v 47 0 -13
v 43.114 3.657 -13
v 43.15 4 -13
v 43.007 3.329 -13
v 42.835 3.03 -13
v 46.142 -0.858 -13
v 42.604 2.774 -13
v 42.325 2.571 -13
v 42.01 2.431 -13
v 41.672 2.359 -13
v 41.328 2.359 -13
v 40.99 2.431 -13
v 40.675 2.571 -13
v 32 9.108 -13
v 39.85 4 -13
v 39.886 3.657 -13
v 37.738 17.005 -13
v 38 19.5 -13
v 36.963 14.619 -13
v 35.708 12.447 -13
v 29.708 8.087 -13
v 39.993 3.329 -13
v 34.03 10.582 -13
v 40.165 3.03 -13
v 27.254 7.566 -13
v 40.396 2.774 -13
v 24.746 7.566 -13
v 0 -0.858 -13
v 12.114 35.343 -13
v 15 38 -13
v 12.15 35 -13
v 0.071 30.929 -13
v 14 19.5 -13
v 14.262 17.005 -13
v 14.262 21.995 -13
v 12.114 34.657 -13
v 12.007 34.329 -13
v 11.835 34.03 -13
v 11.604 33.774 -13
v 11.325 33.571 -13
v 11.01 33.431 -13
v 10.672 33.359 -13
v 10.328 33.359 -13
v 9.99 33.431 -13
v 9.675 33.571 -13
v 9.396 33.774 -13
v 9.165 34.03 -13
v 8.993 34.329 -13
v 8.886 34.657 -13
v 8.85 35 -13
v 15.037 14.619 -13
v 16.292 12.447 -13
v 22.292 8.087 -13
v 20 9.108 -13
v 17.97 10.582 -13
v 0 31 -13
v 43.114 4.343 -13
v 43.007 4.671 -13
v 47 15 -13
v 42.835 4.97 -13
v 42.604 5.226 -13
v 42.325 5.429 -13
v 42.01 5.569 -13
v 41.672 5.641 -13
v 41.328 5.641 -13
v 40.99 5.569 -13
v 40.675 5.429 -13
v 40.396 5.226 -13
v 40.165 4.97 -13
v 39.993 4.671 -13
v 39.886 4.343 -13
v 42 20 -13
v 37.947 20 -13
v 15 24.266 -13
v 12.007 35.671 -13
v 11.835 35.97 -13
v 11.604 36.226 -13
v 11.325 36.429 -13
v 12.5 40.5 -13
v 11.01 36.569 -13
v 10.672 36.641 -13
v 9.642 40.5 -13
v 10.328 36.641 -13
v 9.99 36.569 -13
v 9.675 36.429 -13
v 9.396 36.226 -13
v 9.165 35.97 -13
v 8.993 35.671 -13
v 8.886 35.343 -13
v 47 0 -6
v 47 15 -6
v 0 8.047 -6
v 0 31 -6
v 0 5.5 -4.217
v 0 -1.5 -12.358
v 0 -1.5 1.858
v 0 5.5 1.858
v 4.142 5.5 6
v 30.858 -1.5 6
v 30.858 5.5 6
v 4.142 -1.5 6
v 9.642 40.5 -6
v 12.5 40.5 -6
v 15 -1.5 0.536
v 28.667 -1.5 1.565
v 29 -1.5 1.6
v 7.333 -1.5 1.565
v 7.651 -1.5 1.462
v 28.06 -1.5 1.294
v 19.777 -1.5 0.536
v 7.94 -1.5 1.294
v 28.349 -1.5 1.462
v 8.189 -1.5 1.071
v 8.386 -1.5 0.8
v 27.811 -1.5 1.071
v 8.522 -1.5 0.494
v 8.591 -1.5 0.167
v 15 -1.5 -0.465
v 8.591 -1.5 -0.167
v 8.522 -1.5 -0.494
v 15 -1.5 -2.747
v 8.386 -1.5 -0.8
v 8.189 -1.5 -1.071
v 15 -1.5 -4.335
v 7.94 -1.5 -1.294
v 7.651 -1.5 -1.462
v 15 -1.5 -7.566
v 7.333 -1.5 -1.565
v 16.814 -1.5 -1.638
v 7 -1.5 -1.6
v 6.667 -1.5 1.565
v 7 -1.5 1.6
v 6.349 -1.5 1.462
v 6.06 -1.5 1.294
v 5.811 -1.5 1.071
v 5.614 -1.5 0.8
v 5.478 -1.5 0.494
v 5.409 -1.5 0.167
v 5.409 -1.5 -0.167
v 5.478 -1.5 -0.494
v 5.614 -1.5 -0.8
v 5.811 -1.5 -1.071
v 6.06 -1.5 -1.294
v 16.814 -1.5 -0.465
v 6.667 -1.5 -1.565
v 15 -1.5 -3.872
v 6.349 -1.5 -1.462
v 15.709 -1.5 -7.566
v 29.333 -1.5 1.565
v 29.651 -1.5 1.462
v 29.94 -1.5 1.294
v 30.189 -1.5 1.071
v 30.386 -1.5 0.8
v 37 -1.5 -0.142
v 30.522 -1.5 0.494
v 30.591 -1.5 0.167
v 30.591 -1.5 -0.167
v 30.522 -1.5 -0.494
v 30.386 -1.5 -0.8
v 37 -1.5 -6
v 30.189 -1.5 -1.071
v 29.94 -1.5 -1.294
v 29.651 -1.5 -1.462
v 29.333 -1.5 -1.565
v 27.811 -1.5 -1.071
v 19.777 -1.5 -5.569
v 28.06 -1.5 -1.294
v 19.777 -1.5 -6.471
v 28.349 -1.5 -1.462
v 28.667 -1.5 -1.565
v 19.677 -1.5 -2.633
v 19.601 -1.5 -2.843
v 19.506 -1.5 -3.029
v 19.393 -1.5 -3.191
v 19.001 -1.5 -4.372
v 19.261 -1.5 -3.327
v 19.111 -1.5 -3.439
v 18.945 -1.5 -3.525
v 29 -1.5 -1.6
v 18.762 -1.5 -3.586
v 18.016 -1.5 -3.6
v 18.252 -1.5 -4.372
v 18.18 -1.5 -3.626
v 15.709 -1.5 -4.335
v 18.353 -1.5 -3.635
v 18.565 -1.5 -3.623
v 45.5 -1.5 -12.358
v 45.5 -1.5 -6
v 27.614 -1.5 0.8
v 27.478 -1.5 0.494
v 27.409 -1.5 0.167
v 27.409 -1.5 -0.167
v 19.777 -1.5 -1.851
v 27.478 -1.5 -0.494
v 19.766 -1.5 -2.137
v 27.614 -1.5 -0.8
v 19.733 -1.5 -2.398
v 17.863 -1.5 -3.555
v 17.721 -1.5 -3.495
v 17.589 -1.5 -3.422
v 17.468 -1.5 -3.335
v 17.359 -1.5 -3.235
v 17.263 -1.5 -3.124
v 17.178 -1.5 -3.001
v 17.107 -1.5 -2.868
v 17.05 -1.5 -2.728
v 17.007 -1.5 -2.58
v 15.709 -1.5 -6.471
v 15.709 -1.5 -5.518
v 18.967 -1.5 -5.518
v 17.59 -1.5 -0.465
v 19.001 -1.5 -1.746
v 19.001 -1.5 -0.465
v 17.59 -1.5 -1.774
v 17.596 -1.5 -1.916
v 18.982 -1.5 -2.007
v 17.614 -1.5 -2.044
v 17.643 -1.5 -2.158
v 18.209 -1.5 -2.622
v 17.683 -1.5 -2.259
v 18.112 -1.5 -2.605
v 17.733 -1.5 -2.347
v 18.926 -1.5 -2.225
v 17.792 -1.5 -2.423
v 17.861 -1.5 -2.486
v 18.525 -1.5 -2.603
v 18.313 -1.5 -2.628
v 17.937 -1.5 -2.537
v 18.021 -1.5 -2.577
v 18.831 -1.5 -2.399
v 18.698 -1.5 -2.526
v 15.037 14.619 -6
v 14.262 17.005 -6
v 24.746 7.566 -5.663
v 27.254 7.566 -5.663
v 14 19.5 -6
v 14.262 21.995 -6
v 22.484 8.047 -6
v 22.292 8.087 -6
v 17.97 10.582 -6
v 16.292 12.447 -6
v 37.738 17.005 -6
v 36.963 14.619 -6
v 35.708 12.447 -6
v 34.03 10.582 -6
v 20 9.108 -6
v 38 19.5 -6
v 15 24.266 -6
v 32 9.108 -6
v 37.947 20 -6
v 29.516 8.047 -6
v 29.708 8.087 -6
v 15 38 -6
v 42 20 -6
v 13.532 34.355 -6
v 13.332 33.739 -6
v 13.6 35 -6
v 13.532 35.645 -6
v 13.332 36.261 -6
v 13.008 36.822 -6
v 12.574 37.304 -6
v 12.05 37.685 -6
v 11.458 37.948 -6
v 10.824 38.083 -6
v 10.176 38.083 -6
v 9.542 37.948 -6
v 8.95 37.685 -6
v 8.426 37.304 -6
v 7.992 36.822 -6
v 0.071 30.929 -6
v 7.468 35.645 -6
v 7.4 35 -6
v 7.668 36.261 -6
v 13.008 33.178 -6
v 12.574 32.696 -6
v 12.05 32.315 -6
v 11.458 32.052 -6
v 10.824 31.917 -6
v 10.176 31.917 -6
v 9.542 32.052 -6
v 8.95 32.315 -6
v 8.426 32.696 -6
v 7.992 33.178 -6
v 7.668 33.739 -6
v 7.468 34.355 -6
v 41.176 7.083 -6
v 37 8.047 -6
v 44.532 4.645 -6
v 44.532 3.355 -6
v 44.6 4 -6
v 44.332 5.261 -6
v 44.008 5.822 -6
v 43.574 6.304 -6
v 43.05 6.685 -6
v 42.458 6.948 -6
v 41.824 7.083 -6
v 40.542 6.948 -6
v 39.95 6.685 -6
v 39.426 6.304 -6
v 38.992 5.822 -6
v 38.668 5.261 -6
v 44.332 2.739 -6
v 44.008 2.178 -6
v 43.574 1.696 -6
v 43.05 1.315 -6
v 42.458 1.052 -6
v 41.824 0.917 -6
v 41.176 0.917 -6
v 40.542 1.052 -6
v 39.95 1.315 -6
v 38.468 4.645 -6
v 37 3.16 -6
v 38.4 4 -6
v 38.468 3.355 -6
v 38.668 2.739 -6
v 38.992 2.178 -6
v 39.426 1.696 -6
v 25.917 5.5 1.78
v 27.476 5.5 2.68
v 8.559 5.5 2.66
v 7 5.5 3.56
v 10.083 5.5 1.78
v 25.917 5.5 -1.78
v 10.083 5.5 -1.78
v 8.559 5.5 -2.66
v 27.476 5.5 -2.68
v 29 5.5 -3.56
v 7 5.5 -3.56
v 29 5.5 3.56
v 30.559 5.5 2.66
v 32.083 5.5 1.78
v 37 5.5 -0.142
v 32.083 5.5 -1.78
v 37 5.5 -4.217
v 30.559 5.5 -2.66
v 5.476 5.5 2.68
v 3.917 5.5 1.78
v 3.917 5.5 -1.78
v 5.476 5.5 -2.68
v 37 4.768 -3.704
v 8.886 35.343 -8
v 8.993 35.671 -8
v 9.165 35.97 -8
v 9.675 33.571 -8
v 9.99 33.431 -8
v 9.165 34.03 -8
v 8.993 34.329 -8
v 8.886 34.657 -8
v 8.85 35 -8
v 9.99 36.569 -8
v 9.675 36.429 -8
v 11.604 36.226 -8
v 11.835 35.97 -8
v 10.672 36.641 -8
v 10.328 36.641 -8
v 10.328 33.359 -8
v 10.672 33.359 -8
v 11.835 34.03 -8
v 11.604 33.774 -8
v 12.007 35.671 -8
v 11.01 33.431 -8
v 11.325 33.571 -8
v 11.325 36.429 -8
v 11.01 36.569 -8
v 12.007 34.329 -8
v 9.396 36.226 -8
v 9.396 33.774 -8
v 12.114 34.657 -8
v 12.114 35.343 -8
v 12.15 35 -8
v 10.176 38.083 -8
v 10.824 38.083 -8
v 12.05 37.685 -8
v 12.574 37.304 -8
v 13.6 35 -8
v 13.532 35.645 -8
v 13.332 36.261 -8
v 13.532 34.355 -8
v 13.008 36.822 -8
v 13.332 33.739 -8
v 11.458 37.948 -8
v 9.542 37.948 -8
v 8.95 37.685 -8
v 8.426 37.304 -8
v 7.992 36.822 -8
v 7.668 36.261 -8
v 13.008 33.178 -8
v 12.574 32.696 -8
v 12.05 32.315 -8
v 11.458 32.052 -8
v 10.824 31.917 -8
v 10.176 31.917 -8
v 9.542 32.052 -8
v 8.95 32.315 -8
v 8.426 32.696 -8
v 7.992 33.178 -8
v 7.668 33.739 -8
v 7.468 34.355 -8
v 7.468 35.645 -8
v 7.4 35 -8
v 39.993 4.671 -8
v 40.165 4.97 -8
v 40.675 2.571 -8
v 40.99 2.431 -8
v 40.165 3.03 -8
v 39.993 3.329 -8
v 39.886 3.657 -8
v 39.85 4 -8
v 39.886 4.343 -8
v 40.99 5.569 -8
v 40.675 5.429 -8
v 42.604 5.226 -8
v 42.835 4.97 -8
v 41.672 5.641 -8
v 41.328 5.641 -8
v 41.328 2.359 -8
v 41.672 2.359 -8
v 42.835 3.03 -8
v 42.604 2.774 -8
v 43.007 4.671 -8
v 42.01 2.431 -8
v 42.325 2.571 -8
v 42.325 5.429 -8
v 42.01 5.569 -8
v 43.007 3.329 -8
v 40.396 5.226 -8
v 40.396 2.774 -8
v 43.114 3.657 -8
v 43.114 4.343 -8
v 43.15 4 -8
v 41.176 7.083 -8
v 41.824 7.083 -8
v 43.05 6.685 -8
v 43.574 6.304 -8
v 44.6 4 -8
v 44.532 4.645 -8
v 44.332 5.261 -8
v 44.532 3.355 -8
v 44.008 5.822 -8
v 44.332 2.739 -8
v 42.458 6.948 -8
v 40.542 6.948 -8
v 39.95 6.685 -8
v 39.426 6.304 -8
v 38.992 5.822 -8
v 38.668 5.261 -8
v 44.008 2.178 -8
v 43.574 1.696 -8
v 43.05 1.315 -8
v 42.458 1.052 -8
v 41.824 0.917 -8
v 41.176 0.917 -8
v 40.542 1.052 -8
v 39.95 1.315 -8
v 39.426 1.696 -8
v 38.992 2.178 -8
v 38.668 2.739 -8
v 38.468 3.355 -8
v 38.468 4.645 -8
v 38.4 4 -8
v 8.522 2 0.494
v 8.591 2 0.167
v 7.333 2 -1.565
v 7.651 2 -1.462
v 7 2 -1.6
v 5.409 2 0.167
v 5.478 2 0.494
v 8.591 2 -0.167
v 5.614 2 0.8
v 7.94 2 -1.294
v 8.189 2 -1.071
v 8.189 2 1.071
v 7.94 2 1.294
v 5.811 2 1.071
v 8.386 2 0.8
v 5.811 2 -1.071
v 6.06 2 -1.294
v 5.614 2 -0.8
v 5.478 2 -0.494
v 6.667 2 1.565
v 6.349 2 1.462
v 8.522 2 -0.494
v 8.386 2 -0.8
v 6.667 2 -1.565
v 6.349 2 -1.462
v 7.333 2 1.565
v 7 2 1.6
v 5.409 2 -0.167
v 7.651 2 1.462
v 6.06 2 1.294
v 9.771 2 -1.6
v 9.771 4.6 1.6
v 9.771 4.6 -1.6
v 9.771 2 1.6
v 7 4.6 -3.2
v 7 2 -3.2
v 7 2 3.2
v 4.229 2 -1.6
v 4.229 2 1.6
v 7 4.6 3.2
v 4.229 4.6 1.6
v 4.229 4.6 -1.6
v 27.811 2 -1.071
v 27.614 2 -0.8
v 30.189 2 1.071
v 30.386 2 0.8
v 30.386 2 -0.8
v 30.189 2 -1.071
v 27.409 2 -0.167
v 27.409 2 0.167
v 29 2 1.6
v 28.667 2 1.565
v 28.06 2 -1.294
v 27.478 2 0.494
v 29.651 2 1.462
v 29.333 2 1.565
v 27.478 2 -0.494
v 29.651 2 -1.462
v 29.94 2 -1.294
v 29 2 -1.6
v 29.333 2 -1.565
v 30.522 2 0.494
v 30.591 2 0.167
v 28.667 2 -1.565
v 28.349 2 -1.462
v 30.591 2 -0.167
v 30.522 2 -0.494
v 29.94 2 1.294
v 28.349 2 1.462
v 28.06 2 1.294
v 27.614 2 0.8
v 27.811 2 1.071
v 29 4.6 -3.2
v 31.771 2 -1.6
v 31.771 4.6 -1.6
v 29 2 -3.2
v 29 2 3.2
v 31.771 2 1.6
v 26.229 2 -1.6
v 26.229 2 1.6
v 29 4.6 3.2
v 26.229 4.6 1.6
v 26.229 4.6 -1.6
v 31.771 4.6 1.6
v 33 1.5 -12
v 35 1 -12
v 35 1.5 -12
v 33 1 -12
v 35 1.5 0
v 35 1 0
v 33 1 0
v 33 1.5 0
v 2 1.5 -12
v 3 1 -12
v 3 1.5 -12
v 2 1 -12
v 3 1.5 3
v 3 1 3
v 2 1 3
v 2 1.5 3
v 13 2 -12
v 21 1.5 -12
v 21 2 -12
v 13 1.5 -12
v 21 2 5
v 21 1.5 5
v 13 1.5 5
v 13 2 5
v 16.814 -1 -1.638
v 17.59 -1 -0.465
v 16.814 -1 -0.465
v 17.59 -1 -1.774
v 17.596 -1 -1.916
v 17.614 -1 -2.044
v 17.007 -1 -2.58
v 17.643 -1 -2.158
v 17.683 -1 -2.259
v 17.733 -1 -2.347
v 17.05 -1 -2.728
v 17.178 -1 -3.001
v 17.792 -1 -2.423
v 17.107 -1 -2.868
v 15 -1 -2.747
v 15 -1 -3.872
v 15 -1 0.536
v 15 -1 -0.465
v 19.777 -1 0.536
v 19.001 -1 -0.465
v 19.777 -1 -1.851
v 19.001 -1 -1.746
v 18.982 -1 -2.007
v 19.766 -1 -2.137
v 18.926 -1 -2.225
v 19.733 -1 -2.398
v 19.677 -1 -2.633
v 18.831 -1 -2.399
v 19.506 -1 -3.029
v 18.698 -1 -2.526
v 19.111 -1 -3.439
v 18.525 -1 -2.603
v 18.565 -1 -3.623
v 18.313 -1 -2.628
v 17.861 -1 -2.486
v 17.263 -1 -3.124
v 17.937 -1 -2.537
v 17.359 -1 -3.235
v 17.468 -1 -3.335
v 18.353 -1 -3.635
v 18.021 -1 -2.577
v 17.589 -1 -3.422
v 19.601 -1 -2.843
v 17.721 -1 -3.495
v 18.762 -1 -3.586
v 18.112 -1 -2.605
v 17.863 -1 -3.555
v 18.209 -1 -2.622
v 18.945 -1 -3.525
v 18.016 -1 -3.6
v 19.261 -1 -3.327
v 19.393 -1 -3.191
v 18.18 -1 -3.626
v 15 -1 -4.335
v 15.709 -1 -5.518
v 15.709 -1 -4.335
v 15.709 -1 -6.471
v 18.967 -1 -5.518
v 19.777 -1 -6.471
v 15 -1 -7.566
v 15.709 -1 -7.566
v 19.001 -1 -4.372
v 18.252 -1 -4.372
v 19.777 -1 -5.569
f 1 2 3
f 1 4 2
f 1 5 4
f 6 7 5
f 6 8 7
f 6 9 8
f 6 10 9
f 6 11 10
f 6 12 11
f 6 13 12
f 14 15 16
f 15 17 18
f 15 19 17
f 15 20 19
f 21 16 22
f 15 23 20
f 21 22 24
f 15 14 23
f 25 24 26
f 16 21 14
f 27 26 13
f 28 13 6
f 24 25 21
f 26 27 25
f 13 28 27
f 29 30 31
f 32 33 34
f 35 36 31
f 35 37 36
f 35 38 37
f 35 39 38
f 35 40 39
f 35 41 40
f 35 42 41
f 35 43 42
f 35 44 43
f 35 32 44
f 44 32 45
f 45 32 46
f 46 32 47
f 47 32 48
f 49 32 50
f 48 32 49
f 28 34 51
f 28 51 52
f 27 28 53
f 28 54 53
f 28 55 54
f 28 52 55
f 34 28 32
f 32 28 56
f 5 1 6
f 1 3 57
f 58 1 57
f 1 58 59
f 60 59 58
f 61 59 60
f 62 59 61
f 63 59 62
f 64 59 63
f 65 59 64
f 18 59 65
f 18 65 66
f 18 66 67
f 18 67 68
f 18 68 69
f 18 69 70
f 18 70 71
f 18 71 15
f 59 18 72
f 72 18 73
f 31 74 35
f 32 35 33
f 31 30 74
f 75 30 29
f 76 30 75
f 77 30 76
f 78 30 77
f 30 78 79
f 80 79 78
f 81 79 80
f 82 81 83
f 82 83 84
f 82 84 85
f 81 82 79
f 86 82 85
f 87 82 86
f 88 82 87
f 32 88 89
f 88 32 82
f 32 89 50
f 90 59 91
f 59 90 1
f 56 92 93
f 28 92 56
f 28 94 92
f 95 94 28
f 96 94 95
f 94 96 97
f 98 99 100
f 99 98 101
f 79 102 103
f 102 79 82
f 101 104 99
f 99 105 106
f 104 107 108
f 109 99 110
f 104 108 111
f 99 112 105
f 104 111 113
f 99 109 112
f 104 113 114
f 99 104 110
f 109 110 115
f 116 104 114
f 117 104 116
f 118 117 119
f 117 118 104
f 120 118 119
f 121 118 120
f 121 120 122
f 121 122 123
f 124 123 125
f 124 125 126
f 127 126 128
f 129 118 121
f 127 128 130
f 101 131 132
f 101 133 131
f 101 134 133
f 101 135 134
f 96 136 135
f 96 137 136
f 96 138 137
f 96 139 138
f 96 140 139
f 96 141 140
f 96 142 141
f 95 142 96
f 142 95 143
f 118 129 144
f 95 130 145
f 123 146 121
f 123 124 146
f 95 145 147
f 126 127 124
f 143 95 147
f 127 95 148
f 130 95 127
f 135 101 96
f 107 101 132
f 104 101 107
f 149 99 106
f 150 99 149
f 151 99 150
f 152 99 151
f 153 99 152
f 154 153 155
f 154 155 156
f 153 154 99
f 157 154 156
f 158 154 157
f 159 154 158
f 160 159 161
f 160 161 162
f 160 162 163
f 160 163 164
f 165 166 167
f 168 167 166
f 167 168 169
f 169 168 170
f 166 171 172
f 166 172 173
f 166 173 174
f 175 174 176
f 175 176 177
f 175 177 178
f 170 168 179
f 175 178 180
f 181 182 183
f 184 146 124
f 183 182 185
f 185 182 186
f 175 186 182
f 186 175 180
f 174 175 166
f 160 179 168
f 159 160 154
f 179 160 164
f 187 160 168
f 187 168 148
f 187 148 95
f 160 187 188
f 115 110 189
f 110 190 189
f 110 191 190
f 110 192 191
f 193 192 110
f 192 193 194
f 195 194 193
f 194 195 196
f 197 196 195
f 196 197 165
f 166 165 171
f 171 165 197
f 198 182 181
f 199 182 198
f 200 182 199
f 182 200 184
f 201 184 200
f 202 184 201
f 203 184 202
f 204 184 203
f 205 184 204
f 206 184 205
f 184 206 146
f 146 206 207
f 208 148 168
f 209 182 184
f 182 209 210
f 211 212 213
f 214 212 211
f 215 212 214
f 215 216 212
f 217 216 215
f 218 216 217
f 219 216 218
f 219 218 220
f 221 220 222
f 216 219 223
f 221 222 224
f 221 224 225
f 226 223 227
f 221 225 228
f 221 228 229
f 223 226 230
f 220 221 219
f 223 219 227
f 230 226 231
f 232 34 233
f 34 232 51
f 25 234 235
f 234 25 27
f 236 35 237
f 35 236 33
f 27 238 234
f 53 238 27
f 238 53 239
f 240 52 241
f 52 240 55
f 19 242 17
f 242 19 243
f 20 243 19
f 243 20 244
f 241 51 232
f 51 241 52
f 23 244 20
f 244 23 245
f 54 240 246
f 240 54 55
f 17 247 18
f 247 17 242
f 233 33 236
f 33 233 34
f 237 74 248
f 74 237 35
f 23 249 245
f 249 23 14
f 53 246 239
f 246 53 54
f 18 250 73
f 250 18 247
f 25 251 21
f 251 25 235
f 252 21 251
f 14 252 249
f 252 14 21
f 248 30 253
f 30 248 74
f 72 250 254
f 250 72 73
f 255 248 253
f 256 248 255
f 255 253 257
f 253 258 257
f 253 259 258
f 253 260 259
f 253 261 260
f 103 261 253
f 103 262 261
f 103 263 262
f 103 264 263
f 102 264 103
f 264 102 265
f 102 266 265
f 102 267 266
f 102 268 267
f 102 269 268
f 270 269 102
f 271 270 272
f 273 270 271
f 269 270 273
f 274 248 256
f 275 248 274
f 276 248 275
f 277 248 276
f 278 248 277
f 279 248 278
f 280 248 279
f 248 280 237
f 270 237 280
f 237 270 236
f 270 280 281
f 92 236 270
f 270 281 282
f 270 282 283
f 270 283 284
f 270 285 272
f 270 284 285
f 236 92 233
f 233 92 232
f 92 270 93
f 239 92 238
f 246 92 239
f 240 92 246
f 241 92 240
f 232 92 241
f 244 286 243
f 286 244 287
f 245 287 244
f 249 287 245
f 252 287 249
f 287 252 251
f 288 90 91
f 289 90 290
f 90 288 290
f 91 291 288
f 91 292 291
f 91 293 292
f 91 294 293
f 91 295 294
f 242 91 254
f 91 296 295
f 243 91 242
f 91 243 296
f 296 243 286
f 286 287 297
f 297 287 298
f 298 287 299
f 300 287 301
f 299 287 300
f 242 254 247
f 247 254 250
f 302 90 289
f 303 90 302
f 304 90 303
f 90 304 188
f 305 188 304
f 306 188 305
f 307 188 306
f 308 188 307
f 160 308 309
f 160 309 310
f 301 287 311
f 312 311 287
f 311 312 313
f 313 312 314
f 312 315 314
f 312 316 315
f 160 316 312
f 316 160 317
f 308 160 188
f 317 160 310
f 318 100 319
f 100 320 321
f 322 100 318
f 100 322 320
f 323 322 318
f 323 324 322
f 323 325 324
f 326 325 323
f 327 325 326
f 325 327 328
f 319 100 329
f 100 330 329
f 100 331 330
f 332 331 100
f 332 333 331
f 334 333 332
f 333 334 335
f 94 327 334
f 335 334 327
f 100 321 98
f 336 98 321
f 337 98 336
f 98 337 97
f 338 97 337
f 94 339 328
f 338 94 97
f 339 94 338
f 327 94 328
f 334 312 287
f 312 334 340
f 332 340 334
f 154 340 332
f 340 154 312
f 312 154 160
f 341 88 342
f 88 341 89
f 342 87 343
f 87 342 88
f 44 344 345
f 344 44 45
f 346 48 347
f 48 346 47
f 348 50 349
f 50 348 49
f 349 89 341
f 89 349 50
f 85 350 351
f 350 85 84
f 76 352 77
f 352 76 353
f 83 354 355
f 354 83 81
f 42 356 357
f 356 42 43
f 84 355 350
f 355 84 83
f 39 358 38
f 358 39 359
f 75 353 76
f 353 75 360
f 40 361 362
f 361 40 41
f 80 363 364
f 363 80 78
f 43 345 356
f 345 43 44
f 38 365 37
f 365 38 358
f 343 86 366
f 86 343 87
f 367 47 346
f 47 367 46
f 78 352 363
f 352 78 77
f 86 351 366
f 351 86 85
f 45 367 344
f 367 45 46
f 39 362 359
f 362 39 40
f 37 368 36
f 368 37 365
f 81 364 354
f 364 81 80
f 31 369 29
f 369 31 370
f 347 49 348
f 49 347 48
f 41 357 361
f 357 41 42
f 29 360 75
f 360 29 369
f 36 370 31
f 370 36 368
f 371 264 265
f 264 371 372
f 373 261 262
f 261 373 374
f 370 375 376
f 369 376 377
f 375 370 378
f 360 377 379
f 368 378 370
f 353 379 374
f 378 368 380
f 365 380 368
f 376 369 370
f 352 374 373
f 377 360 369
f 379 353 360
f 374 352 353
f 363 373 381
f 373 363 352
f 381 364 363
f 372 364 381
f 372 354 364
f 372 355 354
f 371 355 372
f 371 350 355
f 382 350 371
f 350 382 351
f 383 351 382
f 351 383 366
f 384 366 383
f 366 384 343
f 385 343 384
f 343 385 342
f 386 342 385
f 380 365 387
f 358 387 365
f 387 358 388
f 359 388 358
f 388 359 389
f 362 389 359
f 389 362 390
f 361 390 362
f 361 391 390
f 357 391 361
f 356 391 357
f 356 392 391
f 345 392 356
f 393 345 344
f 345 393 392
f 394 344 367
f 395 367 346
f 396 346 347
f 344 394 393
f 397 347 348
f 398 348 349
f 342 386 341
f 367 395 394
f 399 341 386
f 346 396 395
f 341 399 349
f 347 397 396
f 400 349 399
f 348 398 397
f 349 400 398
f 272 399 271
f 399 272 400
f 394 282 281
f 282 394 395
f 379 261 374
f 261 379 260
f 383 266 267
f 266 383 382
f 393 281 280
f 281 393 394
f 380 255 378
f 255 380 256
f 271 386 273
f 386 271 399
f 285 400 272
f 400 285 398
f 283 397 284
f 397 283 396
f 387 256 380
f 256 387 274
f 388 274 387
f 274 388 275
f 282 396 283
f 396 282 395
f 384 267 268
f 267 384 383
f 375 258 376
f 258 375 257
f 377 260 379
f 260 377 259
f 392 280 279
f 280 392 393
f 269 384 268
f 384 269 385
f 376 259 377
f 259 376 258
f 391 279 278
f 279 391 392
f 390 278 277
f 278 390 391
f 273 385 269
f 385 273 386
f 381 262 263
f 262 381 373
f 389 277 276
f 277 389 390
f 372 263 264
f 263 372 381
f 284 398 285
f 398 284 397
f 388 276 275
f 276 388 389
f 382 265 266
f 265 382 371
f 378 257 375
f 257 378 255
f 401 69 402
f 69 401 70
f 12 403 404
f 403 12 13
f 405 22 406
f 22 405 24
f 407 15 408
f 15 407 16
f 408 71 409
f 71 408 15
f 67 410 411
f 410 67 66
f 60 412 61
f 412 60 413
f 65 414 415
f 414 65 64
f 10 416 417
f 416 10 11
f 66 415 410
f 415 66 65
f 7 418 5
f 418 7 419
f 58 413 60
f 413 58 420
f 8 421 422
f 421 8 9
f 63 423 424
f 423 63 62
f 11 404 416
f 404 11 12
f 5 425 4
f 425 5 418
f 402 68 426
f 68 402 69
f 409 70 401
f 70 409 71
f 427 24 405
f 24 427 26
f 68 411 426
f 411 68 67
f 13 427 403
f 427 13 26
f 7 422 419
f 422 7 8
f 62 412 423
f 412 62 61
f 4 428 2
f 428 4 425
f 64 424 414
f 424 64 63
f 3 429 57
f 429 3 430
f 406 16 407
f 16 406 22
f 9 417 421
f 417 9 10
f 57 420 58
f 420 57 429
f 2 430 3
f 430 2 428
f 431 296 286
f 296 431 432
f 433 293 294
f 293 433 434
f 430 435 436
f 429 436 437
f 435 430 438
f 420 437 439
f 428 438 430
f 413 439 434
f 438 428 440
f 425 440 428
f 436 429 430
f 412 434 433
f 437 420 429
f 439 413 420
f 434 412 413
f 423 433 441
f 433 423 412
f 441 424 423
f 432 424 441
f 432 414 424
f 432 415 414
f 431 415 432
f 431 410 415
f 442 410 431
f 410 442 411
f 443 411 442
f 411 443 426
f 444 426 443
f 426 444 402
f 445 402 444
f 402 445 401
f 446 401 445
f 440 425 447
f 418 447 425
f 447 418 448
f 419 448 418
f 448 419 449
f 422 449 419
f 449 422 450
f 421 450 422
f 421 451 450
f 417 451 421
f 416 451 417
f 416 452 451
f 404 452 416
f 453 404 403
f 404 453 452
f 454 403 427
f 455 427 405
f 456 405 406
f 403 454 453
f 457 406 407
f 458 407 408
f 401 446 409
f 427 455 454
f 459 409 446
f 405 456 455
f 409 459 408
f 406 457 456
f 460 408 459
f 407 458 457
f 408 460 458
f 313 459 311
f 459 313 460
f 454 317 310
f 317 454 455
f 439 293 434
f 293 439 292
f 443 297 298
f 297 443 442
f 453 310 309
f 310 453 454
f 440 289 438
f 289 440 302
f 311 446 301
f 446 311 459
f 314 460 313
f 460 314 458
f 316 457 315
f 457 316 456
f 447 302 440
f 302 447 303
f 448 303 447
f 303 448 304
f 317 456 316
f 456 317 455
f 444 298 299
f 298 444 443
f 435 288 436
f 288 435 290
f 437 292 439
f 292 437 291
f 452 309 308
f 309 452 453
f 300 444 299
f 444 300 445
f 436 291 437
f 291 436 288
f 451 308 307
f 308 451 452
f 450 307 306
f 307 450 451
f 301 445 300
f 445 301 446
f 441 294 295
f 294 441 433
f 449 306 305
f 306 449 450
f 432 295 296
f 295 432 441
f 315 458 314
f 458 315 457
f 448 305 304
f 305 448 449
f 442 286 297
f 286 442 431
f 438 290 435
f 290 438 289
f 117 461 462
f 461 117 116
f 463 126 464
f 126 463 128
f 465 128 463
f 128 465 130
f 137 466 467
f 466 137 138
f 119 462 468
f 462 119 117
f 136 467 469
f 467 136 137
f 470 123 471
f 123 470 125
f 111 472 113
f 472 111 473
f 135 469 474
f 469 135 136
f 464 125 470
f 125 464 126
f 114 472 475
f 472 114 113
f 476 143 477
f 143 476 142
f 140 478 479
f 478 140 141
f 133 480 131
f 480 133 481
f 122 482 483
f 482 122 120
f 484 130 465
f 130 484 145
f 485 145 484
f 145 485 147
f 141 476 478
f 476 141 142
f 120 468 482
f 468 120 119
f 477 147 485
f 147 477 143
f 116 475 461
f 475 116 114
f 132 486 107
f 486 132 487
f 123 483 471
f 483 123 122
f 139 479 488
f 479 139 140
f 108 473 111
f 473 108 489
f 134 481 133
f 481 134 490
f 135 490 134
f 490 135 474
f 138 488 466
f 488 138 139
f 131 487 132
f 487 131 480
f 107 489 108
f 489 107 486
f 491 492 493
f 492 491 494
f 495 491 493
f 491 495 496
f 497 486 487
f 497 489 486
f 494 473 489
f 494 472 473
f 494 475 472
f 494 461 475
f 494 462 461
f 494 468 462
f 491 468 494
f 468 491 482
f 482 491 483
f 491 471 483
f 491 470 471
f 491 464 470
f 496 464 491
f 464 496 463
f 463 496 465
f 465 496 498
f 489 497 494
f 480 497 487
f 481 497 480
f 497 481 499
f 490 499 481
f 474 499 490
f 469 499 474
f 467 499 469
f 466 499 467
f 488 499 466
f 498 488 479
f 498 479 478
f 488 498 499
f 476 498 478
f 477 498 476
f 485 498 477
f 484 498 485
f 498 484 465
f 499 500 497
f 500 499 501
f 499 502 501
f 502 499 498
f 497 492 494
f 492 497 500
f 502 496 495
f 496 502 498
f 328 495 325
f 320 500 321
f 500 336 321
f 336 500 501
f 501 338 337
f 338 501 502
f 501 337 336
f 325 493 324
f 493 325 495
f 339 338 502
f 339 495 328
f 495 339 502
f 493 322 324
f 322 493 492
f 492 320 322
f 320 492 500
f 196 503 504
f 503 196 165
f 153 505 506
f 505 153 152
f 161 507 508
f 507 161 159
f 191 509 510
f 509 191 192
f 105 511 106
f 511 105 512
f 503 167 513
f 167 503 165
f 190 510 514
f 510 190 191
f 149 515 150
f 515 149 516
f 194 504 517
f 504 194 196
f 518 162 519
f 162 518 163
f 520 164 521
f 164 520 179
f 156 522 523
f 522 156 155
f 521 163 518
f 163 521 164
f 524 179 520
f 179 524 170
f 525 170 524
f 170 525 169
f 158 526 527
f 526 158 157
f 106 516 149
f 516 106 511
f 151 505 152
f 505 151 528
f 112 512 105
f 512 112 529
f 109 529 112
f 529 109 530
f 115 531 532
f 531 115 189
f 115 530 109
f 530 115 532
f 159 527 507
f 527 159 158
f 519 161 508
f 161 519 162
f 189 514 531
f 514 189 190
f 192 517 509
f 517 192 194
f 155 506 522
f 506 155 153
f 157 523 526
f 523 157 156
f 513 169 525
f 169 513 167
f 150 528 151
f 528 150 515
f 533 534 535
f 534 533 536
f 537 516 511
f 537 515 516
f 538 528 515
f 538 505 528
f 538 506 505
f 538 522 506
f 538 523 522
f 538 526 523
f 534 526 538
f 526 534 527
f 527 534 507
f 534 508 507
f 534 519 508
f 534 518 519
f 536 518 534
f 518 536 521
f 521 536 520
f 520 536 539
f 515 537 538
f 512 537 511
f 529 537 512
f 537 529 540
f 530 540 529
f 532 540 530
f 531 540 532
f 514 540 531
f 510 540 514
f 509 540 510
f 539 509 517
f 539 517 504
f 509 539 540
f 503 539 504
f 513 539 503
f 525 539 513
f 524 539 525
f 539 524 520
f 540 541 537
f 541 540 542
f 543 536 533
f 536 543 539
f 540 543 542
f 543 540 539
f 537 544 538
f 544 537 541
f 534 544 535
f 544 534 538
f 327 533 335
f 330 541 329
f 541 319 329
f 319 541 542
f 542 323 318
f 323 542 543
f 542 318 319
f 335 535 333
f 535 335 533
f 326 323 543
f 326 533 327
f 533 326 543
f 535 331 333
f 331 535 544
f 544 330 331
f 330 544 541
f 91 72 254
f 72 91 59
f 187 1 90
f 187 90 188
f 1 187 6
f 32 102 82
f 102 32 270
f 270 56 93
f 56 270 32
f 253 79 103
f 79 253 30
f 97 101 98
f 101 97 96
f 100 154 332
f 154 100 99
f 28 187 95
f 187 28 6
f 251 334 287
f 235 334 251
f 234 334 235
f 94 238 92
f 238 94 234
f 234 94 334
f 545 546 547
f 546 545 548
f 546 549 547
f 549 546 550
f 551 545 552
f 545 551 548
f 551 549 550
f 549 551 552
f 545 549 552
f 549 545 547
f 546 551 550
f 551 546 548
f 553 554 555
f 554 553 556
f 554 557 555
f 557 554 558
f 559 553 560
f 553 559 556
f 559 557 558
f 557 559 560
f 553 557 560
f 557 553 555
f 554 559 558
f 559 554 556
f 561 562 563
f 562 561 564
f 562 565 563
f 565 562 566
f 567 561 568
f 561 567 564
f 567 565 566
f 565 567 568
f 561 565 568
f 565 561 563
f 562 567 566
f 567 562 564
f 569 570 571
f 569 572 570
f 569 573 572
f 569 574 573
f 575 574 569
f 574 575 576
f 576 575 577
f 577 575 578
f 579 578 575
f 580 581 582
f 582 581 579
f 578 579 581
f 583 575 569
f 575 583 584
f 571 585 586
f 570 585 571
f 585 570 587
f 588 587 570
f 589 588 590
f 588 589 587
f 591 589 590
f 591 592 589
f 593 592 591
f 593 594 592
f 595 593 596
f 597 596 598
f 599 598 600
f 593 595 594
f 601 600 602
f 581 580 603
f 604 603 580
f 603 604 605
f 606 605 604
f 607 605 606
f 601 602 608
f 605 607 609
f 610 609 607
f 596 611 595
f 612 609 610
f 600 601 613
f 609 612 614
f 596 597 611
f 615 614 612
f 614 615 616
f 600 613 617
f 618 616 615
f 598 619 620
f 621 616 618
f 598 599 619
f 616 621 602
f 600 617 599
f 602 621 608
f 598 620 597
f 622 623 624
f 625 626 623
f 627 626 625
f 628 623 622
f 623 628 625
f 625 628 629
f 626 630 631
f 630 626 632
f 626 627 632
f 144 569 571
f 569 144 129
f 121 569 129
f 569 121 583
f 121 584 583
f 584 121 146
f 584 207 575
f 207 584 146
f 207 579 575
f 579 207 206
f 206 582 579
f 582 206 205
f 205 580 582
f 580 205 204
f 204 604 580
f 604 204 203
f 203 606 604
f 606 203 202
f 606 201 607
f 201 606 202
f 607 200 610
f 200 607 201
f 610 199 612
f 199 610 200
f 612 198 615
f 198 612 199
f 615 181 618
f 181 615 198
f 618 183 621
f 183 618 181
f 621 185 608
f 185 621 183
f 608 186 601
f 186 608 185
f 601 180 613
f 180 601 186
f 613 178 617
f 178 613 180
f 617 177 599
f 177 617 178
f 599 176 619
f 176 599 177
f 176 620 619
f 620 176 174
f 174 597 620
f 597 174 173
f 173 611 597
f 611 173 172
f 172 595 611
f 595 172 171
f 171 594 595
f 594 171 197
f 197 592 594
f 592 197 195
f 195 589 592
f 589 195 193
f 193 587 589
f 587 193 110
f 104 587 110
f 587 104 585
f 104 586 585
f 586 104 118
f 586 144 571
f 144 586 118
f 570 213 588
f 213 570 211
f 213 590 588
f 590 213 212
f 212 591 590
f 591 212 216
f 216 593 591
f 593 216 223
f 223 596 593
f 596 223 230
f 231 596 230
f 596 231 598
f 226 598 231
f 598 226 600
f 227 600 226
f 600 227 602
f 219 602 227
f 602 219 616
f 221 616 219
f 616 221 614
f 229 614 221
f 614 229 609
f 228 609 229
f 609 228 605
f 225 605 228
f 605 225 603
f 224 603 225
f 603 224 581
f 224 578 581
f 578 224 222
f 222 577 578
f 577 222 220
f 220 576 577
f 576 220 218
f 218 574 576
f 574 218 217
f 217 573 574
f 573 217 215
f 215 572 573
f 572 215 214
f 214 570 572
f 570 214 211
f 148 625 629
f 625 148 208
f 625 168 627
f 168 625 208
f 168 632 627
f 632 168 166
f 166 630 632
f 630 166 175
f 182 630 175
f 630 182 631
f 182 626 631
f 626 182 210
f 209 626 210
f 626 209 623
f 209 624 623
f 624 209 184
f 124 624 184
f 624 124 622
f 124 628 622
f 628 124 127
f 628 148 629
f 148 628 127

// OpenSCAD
// PRUSA iteration4
// Y motor holder
// GNU GPL v3
// Josef Průša <iam@josefprusa.cz> and contributors
// http://www.reprap.org/wiki/Prusa_Mendel
// http://prusamendel.org

module holder()
{
    difference()
    {
        // base body
        translate([-6,-1.5,0]) cube([19,42,47]);

        // shape cuts
        translate([-20,19.5,26]) rotate([0,90,0]) cylinder( h=35, r=12, $fn=30 );   
        translate([-11,20,15]) cube([26,23,64]);
        translate([-20,5.5,-1]) cube([26,41,64]);
        translate([-20,-5,37]) cube([26,21,20]);
        translate([-20,-1,37]) cube([26,30,20]);
        
        // lower motor screw
        translate([-20,35 ,10.5]) rotate([0,90,0]) cylinder( h=40, r=1.65, $fn=30 ); 
        translate([-7,35,10.5]) rotate([0,90,0]) cylinder( h=15, r=3.1, $fn=30 );         
        
        // upper motor screw    
        translate([-20,4,41.5]) rotate([0,90,0]) cylinder( h=40, r=1.65, $fn=30 );         
        translate([4,4,41.5]) rotate([0,90,0]) cylinder( h=4, r=3.1, $fn=30 );         
        
        // lower frame screw    
        translate([0,12,7]) rotate([90,0,0]) cylinder( h=40, r=1.6, $fn=30 ); 
        translate([0,7,7]) rotate([90,0,0]) cylinder( h=5, r=3.2, $fn=6 ); 
        translate([0,6.6,7]) rotate([90,0,0]) cylinder( h=2, r2=3.2, r1=4, $fn=6 ); 
        
        // upper frame screw    
        translate([0,12,29]) rotate([90,0,0]) cylinder( h=40, r=1.6, $fn=30 ); 
        translate([0,7,29]) rotate([90,0,0]) cylinder( h=5, r=3.2, $fn=6 ); 
        translate([0,6.6,29]) rotate([90,0,0]) cylinder( h=2, r2=3.2, r1=4, $fn=6 );

        // corners
        translate([-10,20,42]) rotate([45,0,0]) cube([60,10,10]);        
        translate([-10,-5,42]) rotate([45,0,0]) cube([60,10,10]);        
        translate([-10,38,-7]) rotate([45,0,0]) cube([60,20,10]);        
        translate([-10,43,10]) rotate([45,0,0]) cube([60,20,20]);  
        translate([-14,-10,-2]) rotate([0,45,0]) cube([10,50,10]);        
        translate([-14,-10,37]) rotate([0,45,0]) cube([10,50,10]);        
        translate([18,-10,-5]) rotate([0,0,45]) cube([10,10,60]);        
    }
    
    // reinforcement
    translate([7.8,1.9,0]) rotate([0,0,55]) cube([5,5,18]);
    difference()
        {
            translate([7.8,1.9,13.6]) rotate([0,0,55]) cube([5,5,23.4]);
            translate([-20,19.5,26]) rotate([0,90,0]) cylinder( h=35, r=12, $fn=30 );   
        }
   
}
 
module y_motor_holder()
{
    rotate([0,90,0])
    difference()
        {
        holder();
       
        // selective infill
        translate([-0,1,33]) cube([12,0.5,2]);        
        translate([-3,1,2]) cube([15,0.5,1]);        
        translate([-5,1.5,13]) cube([17,0.5,8]);        
        
        //version
        translate([-1,-1,15]) rotate([90,0,0]) linear_extrude(height = 0.6) 
        { text("R1",font = "helvetica:style=Bold", size=5, center=true); }
        }
}    
    
y_motor_holder();    
    
    
    
